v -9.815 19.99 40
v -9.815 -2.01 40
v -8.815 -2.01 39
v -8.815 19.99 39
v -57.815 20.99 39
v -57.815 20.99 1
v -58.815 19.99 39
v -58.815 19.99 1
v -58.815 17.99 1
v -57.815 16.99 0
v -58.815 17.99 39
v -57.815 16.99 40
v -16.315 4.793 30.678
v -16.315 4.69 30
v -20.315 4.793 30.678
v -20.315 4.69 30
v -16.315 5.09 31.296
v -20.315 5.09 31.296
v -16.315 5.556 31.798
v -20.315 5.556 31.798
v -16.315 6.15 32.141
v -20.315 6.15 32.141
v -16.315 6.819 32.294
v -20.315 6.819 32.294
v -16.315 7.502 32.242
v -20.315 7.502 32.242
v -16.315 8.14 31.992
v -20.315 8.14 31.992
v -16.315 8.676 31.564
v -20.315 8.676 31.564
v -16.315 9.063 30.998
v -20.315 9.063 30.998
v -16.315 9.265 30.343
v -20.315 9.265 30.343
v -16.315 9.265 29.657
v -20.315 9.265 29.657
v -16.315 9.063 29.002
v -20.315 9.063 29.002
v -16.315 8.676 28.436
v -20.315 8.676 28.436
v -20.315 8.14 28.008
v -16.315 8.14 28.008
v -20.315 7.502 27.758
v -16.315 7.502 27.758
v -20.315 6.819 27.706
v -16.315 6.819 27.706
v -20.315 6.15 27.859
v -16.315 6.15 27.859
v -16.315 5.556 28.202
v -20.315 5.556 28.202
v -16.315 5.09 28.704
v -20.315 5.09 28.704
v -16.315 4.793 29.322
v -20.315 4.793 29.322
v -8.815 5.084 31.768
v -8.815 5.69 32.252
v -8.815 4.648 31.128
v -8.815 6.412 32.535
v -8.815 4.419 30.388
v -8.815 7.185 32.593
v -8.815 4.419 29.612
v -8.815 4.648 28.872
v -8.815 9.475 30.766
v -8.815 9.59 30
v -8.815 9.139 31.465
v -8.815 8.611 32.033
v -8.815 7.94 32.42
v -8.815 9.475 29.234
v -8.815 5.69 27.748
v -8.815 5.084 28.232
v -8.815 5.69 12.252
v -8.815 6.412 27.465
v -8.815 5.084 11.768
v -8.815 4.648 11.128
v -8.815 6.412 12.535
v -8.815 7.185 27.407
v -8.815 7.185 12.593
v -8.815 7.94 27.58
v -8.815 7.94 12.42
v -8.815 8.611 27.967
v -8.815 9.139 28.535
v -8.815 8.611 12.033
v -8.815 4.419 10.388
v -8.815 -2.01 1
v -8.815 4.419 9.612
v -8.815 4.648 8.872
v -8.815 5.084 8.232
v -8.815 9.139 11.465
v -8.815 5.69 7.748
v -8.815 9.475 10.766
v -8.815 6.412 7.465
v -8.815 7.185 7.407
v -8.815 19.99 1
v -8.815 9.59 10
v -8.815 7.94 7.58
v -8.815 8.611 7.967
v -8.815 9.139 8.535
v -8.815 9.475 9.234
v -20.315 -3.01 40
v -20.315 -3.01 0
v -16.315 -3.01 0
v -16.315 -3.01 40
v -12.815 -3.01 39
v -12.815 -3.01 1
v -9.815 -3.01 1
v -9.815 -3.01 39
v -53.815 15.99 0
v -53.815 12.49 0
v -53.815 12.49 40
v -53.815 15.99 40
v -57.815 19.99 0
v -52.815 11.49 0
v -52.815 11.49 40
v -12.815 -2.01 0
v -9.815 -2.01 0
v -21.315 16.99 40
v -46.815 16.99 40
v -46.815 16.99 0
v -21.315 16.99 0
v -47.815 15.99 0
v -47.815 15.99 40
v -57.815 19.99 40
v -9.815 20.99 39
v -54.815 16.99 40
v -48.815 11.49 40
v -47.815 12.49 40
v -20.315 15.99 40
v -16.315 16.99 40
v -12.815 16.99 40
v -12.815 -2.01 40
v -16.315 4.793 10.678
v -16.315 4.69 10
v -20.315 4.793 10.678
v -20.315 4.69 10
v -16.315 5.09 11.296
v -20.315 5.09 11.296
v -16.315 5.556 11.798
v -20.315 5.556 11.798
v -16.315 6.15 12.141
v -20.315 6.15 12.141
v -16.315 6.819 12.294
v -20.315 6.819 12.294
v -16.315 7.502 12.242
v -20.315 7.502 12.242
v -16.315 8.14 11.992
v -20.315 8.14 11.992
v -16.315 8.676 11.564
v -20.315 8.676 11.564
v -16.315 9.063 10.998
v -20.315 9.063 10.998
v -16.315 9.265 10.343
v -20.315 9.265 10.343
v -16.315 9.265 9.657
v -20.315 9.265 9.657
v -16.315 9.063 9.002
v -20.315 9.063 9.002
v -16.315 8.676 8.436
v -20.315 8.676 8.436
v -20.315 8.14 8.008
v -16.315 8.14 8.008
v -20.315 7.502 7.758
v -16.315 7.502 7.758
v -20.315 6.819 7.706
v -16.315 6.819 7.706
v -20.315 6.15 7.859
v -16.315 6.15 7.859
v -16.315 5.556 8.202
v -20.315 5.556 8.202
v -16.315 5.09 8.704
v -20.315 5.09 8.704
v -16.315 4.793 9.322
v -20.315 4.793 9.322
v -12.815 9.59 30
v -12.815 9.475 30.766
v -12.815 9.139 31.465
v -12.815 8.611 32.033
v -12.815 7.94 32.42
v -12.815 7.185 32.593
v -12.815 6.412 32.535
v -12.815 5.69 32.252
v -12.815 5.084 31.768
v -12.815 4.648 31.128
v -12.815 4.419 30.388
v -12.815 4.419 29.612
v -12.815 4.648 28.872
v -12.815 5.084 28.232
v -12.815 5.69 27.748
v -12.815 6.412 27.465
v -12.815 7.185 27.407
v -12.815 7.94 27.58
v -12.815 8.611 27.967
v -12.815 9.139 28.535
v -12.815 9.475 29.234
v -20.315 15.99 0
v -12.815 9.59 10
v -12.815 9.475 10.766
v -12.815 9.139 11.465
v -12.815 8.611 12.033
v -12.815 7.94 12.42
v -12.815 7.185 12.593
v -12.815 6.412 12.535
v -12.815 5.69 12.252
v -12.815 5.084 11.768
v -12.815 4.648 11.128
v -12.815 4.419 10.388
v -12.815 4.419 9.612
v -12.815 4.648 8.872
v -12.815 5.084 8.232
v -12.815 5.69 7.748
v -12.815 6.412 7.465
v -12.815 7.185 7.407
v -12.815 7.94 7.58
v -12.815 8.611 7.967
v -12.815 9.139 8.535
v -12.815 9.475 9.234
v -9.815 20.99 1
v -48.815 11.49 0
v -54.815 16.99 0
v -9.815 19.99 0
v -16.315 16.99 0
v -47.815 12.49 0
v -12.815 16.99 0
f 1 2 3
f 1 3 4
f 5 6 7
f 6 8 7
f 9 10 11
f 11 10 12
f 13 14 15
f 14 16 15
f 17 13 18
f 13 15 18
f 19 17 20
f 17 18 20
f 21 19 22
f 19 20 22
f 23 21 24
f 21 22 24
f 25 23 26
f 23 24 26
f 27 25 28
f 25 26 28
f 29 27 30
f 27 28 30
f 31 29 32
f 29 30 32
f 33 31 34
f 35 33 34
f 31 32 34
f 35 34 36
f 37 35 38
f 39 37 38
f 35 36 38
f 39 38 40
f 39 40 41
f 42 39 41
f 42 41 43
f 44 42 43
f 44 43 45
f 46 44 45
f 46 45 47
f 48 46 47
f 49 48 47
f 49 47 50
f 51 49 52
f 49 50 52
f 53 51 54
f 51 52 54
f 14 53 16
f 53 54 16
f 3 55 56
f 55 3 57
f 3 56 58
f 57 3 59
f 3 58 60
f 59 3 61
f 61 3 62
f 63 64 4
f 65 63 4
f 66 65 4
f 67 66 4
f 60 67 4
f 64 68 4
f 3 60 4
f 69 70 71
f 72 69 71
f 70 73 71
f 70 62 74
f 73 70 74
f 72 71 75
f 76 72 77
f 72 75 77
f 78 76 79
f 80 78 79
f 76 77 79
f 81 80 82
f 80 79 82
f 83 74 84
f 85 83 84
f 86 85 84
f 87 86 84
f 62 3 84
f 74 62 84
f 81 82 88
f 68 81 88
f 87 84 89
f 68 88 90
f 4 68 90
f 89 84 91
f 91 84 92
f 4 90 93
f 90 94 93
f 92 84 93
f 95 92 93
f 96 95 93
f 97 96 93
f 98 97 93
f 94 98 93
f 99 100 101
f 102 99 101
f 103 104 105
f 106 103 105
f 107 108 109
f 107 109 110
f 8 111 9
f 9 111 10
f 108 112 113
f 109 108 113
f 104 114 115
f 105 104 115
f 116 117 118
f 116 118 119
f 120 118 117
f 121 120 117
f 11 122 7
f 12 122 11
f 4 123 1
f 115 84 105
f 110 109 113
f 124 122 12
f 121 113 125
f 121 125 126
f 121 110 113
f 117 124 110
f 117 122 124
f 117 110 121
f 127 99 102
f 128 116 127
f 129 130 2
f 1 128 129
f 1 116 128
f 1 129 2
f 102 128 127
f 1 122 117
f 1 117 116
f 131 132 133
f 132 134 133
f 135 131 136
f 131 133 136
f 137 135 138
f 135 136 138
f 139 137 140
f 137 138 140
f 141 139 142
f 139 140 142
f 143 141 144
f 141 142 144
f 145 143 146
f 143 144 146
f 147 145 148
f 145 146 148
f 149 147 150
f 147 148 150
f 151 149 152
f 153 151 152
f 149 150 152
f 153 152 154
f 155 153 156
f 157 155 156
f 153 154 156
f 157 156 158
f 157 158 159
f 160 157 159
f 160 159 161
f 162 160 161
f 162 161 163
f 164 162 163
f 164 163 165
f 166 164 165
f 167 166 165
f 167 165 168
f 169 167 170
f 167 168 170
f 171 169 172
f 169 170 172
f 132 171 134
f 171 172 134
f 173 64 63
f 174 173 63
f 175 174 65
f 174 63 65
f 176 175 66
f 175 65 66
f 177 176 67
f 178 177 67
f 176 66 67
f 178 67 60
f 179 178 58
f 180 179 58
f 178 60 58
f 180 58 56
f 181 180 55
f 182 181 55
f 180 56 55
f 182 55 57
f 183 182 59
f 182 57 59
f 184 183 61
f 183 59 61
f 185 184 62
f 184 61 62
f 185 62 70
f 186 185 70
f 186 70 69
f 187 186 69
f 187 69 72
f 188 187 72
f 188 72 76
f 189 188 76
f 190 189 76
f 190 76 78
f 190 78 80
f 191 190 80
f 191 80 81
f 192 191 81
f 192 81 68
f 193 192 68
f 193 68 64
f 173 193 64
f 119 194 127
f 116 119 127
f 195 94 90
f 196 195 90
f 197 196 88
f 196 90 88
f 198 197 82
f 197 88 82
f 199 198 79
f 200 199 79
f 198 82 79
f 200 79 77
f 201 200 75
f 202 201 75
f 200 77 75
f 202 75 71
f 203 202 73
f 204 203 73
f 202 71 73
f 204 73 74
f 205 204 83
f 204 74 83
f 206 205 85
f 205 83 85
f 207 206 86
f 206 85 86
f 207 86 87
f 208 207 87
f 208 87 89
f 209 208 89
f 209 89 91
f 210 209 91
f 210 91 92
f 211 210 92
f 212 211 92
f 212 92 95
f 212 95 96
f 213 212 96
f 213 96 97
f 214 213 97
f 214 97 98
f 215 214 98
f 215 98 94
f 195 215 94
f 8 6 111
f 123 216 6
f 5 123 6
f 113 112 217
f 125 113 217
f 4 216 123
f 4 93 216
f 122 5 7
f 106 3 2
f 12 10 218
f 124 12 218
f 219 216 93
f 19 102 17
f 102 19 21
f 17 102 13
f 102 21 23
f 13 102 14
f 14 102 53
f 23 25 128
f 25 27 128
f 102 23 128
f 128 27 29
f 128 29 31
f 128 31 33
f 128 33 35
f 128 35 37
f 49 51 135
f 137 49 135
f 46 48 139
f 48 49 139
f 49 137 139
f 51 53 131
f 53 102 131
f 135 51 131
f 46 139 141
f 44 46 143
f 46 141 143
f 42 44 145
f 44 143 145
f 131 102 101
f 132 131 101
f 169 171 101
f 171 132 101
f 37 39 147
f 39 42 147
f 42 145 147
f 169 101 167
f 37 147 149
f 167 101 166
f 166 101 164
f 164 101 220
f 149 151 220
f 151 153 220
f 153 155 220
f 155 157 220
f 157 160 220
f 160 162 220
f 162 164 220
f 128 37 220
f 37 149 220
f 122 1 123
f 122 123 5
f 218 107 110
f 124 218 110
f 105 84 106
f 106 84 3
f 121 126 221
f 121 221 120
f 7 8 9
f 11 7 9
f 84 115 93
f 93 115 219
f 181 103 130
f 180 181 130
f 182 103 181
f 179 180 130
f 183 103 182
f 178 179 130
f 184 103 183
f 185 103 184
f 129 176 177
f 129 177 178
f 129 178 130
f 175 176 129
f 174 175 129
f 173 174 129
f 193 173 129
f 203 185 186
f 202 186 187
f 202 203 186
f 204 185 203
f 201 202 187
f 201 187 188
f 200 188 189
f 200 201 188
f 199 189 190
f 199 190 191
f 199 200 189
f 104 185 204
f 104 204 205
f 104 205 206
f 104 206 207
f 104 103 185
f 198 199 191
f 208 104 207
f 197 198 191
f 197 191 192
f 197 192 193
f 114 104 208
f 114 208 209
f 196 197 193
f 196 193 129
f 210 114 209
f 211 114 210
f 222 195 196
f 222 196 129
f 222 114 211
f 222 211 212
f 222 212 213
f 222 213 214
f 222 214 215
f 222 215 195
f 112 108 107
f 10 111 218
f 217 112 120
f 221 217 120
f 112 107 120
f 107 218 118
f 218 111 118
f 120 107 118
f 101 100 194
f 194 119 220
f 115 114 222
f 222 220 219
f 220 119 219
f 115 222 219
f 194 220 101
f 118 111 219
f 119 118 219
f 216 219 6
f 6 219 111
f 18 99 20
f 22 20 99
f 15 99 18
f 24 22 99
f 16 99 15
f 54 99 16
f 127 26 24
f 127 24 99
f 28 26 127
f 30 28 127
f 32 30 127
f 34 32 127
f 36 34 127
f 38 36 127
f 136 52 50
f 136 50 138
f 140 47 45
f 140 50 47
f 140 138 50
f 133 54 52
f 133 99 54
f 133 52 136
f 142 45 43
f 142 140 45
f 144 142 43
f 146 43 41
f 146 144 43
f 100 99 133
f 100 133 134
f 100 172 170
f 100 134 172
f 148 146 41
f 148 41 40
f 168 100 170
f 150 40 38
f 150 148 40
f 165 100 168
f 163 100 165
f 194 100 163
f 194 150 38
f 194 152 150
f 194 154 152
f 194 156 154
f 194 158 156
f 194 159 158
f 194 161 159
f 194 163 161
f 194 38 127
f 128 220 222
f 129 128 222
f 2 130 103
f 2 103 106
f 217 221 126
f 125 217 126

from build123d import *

# Parameters (mm, degrees)
F0_W           = 4
F0_H           = 20
F0_W_2         = 6
F0_H_2         = 5.5
F1_DEPTH       = 40
F2_SIZE        = 1
F4_D           = 4.6
F4_DEPTH       = 12
F4_CBORE_D     = 5.2
F4_CBORE_DEPTH = 6


with BuildPart() as f1:
    # F0 (on Top) → F1 (new body)
    with BuildSketch(Plane.XY):
        Polygon((-8.815112, 20.990383), (-58.815112, 20.990383), (-58.815112, 16.990383), (-53.815112, 16.990383), (-47.815112, 16.990383), (-20.315112, 16.990383), (-16.315112, 16.990383), (-12.815112, 16.990383), (-8.815112, 16.990383), align=None)
        with Locations((-10.815112, 6.990383)):
            Rectangle(F0_W, F0_H)
        with Locations((-50.815112, 14.240383)):
            Rectangle(F0_W_2, F0_H_2)
        with Locations((-18.315112, 6.990383)):
            Rectangle(F0_W, F0_H)
    extrude(amount=F1_DEPTH)

    # F2
    f2_edges = [f1.edges().sort_by_distance(p)[0] for p in [
        (-47.815112, 16.990383, 20),
        (-53.815112, 16.990383, 20),
        (-53.815112, 11.490383, 20),
        (-58.815112, 16.990383, 20),
        (-58.815112, 20.990383, 20),
        (-8.815112, 20.990383, 20),
        (-8.815112, -3.009617, 20),
        (-33.815112, 20.990383, 40),
        (-33.815112, 20.990383, 0),
        (-20.315112, 16.990383, 20),
        (-8.815112, 8.990383, 40),
        (-8.815112, 8.990383, 0),
        (-58.815112, 18.990383, 40),
        (-58.815112, 18.990383, 0),
        (-47.815112, 11.490383, 20),
        (-10.815112, -3.009617, 0),
        (-10.815112, -3.009617, 40),
    ]]
    chamfer(f2_edges, length=F2_SIZE)

    # F4
    with Locations(Plane.YZ.offset(-8.815112)):
        with Locations((6.990383, 10), (6.990383, 30)):
            CounterBoreHole(F4_D / 2, F4_CBORE_D / 2, F4_CBORE_DEPTH, depth=F4_DEPTH)


solid = f1.part
